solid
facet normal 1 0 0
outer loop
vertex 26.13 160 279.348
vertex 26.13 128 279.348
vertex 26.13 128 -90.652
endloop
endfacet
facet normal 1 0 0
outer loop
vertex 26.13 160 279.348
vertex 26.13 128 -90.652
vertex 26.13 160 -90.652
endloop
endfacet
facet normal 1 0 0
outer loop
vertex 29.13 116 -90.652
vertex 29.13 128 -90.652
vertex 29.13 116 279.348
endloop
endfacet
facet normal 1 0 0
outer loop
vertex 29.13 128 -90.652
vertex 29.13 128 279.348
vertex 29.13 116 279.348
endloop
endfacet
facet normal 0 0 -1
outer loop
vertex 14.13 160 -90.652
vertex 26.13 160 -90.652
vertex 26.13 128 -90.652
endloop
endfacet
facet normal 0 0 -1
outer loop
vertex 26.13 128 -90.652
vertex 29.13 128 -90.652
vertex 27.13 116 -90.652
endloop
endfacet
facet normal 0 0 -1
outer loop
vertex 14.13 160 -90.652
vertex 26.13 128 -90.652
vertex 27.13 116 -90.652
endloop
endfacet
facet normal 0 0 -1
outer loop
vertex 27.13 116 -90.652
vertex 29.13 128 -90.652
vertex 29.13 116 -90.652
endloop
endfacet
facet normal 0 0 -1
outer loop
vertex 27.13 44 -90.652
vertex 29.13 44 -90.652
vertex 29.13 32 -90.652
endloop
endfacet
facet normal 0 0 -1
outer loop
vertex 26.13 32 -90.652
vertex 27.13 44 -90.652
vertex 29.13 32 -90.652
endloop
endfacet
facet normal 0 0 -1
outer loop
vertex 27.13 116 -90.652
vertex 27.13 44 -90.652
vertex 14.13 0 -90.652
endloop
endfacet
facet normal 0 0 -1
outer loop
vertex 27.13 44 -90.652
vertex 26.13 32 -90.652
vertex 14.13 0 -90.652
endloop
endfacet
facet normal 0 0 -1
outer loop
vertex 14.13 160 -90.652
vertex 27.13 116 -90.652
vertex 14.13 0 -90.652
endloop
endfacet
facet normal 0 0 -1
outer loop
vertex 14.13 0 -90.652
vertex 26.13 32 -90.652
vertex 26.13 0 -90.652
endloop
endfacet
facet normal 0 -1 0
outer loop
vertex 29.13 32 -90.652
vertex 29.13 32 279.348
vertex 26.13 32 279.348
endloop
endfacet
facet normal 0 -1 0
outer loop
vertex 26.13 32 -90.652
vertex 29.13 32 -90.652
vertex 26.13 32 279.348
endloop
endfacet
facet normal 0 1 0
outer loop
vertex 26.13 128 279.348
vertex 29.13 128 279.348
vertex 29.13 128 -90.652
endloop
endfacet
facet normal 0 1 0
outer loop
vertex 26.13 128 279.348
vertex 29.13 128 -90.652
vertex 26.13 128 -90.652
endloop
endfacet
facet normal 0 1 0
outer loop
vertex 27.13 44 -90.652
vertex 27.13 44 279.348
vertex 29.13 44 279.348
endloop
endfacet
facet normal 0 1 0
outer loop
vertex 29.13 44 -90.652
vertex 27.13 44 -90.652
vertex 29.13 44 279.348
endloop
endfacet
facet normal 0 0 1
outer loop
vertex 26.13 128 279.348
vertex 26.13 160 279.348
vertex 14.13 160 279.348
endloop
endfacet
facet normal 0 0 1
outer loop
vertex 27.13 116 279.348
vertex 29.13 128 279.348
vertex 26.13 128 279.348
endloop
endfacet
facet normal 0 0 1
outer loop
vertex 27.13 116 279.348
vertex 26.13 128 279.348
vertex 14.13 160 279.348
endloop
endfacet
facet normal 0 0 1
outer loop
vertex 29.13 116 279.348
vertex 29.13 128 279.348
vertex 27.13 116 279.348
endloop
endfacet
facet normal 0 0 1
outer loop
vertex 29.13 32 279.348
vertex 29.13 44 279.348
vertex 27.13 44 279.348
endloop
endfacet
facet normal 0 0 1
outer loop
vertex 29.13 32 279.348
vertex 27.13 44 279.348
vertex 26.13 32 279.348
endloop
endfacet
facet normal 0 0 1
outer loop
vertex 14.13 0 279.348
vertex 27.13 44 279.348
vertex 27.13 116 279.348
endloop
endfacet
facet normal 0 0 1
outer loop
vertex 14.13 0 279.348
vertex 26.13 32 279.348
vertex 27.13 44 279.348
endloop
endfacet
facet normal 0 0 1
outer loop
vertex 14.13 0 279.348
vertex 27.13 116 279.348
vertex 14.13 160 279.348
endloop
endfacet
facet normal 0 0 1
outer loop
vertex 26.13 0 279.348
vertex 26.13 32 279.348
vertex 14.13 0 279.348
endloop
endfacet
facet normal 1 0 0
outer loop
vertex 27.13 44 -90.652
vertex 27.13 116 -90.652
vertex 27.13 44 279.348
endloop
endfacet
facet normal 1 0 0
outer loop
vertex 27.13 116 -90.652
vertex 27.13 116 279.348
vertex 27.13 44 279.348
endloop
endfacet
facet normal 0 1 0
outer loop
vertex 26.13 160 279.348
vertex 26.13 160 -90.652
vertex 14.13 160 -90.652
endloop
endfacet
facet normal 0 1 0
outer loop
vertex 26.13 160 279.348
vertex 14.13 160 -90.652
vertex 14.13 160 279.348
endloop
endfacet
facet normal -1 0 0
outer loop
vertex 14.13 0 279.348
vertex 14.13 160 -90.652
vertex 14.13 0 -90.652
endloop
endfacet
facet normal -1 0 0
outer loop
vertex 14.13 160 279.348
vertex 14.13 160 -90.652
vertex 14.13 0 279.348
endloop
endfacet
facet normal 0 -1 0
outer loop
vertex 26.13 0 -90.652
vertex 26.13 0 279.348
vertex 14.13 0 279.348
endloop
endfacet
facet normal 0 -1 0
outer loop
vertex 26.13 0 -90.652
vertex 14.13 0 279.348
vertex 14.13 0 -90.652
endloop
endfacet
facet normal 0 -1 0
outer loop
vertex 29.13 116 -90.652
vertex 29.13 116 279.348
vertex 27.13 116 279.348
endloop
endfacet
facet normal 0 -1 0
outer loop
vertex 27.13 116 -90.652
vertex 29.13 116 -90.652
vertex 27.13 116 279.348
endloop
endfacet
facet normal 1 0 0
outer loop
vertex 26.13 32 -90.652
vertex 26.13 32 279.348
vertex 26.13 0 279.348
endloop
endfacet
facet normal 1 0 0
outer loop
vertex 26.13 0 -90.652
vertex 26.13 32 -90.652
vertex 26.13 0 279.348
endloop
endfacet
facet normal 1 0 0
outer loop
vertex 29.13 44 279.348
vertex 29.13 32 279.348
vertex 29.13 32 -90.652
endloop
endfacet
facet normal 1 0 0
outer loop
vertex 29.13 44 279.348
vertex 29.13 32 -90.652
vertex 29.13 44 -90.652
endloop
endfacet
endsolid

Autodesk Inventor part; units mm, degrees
ref_plane "YZ Plane" through (0, 0, 0) normal (1, 0, 0) x (0, 1, 0)
ref_plane "XZ Plane" through (0, 0, 0) normal (0, 1, 0) x (-1, 0, 0)
ref_plane "XY Plane" through (0, 0, 0) normal (0, 0, 1) x (1, 0, 0)
sketch "Sketch1" plane through (0, 0, 0) normal (0, 1, 0) x (-1, 0, 0)
  line L0 (0, 279.3478) -> (-39.1304, 279.3478)
  line L1 (-39.1304, 279.3478) -> (-39.1304, -195.6522)
  line L2 (-39.1304, -195.6522) -> (0, -195.6522)
  line L3 (0, -195.6522) -> (0, 279.3478)
  line L4 (-39.1304, 279.3478) -> (-29.1304, 279.3478)
  line L5 (-29.1304, 254.3478) -> (-39.1304, 254.3478)
  line L6 (-39.1304, 254.3478) -> (-39.1304, 279.3478)
  line L7 (-39.1304, -195.6522) -> (-29.1304, -195.6522)
  line L8 (-29.1304, -170.6522) -> (-39.1304, -170.6522)
  line L9 (-39.1304, -170.6522) -> (-39.1304, -195.6522)
  point P0 (0, 0)
  point P1 (-39.1304, 254.3478)
  dimension "d0" = 475
  dimension "d4" = 25
  dimension "d5" = 25
extrude "Extrusion1" add sketch "Sketch1" along normal blind 160
sketch "Sketch2" plane through (0, 0, 279.3478) normal (0, 0, 1) x (1, 0, 0)
  line L0 (0, 160) -> (39.1304, 160) projected
  line L1 (0, 160) -> (39.1304, 160)
  line L2 (39.1304, 160) -> (39.1304, 0)
  line L3 (39.1304, 0) -> (0, 0)
  line L4 (0, 0) -> (0, 160)
  line L5 (39.1304, 160) -> (29.1304, 160)
  line L6 (29.1304, 160) -> (29.1304, 115)
  line L7 (29.1304, 115) -> (39.1304, 115)
  line L8 (39.1304, 115) -> (39.1304, 160)
  line L9 (39.1304, 0) -> (29.1304, 0)
  line L10 (29.1304, 0) -> (29.1304, 45)
  line L11 (29.1304, 45) -> (39.1304, 45)
  line L12 (39.1304, 45) -> (39.1304, 0)
  circle A0 centre (39.1304, 80) radius 18
  line L13 (35.1304, 75) -> (39.1304, 75)
  line L14 (39.1304, 75) -> (39.1304, 98)
  line L15 (39.1304, 98) -> (35.1304, 98)
  line L16 (35.1304, 98) -> (35.1304, 75)
  line L17 (35.1304, 75) -> (39.1304, 75)
  line L18 (39.1304, 75) -> (39.1304, 62)
  line L19 (39.1304, 62) -> (35.1304, 62)
  line L20 (35.1304, 62) -> (35.1304, 75)
  line L21 (39.1304, 0) -> (39.1304, 160) projected
  line L22 (0, 160) -> (19.1304, 160)
  line L23 (19.1304, 160) -> (19.1304, 0)
  line L24 (19.1304, 0) -> (0, 0)
  line L25 (0, 0) -> (0, 160)
  point P0 (0, 0)
  point P1 (34.1304, 115)
  point P2 (34.1304, 160)
  point P3 (39.1304, 45)
  point P4 (39.1304, 115)
  dimension "d6" = 10
  dimension "d7" = 45
  dimension "d8" = 45
  dimension "d9" = 4
  dimension "d10" = 36
  dimension "d11" = 80
  dimension "d12" = 80
  dimension "d15" = 20
extrude "Extrusion2" cut sketch "Sketch2" against normal up to surface (475 mm away) contours L0 L23 L3 L4 | L0 L2 L7 L6 | L10 L11 L2 L3 | L2 L13 L16 A0 | A0 L16 L15 | L2 A0 L20 L13 | L19 L20 A0
sketch "Sketch3" plane through (0, 160, 0) normal (0, 1, 0) x (1, 0, 0)
  line L0 (-18, 249) -> (160, 249)
  line L1 (160, 249) -> (160, 90.6522)
  line L2 (160, 90.6522) -> (-18, 90.6522)
  line L3 (-18, 90.6522) -> (-18, 249)
  line L4 (19.1304, -279.3478) -> (29.1304, -279.3478) projected
  point P0 (0, 0)
  dimension "d16" = 370
extrude "Extrusion3" cut sketch "Sketch3" against normal blind 200
sketch "Sketch4" plane through (39.1304, 98, 279.3478) normal (1, 0, 0) x (0, 0, -1)
  line L0 (370, 0) -> (370, 17) projected
  line L1 (370, 17) -> (0, 17) projected
  line L2 (0, 0) -> (0, 17) projected
  line L3 (0, 0) -> (370, 0) projected
  line L4 (370, -53) -> (370, -36) projected
  line L5 (370, -36) -> (0, -36) projected
  line L6 (0, -53) -> (0, -36) projected
  line L7 (0, -53) -> (370, -53) projected
  point P0 (279.3478, -98)
extrude "Extrusion4" add sketch "Sketch4" along normal blind 30
sketch "Sketch5" plane through (19.1304, 0, 279.3478) normal (-1, 0, 0) x (0, 0, 1)
  line L0 (-370, 160) -> (-370, 0) projected
  line L1 (0, 0) -> (-370, 0) projected
  line L2 (0, 160) -> (0, 0) projected
  line L3 (-370, 160) -> (0, 160) projected
  point P0 (-279.3478, 0)
extrude "Extrusion5" add sketch "Sketch5" along normal blind 5
sketch "Sketch6" plane through (29.1304, 115, 279.3478) normal (0, 0, 1) x (1, 0, 0)
  line L0 (9, 13) -> (-3, 13)
  line L1 (-3, 13) -> (-3, 45)
  line L2 (-3, 45) -> (9, 45)
  line L3 (9, 45) -> (9, 13)
  line L4 (-15, -115) -> (0, -115) projected
  line L5 (11, -83) -> (-3, -83)
  line L6 (-3, -83) -> (-3, -115)
  line L7 (-3, -115) -> (11, -115)
  line L8 (11, -115) -> (11, -83)
  line L9 (0, -70) -> (40, -70) projected
  line L10 (0, 0) -> (40, 0) projected
  line L11 (0, 0) -> (0, 45) projected
  point P0 (-29.1304, -115)
  point P1 (0, -115)
  dimension "d23" = 13
  dimension "d24" = 13
  dimension "d25" = 3
extrude "Extrusion6" cut sketch "Sketch6" against normal blind 500
sketch "Sketch7" plane through (35.1304, 62, 279.3478) normal (0, 0, 1) x (1, 0, 0)
  line L0 (55, 54) -> (-8, 54)
  line L1 (-8, 54) -> (-8, -18)
  line L2 (-8, -18) -> (55, -18)
  line L3 (55, -18) -> (55, 54)
  line L4 (-6, 53) -> (34, 53) projected
  line L5 (-6, -17) -> (34, -17) projected
  line L6 (-6, -30) -> (-6, -17) projected
  point P0 (-35.1304, -62)
  dimension "d28" = 1
  dimension "d29" = 1
  dimension "d30" = 2
extrude "Extrusion7" cut sketch "Sketch7" against normal blind 1000
properties part number "MainRails" material "Aluminum 6061"
